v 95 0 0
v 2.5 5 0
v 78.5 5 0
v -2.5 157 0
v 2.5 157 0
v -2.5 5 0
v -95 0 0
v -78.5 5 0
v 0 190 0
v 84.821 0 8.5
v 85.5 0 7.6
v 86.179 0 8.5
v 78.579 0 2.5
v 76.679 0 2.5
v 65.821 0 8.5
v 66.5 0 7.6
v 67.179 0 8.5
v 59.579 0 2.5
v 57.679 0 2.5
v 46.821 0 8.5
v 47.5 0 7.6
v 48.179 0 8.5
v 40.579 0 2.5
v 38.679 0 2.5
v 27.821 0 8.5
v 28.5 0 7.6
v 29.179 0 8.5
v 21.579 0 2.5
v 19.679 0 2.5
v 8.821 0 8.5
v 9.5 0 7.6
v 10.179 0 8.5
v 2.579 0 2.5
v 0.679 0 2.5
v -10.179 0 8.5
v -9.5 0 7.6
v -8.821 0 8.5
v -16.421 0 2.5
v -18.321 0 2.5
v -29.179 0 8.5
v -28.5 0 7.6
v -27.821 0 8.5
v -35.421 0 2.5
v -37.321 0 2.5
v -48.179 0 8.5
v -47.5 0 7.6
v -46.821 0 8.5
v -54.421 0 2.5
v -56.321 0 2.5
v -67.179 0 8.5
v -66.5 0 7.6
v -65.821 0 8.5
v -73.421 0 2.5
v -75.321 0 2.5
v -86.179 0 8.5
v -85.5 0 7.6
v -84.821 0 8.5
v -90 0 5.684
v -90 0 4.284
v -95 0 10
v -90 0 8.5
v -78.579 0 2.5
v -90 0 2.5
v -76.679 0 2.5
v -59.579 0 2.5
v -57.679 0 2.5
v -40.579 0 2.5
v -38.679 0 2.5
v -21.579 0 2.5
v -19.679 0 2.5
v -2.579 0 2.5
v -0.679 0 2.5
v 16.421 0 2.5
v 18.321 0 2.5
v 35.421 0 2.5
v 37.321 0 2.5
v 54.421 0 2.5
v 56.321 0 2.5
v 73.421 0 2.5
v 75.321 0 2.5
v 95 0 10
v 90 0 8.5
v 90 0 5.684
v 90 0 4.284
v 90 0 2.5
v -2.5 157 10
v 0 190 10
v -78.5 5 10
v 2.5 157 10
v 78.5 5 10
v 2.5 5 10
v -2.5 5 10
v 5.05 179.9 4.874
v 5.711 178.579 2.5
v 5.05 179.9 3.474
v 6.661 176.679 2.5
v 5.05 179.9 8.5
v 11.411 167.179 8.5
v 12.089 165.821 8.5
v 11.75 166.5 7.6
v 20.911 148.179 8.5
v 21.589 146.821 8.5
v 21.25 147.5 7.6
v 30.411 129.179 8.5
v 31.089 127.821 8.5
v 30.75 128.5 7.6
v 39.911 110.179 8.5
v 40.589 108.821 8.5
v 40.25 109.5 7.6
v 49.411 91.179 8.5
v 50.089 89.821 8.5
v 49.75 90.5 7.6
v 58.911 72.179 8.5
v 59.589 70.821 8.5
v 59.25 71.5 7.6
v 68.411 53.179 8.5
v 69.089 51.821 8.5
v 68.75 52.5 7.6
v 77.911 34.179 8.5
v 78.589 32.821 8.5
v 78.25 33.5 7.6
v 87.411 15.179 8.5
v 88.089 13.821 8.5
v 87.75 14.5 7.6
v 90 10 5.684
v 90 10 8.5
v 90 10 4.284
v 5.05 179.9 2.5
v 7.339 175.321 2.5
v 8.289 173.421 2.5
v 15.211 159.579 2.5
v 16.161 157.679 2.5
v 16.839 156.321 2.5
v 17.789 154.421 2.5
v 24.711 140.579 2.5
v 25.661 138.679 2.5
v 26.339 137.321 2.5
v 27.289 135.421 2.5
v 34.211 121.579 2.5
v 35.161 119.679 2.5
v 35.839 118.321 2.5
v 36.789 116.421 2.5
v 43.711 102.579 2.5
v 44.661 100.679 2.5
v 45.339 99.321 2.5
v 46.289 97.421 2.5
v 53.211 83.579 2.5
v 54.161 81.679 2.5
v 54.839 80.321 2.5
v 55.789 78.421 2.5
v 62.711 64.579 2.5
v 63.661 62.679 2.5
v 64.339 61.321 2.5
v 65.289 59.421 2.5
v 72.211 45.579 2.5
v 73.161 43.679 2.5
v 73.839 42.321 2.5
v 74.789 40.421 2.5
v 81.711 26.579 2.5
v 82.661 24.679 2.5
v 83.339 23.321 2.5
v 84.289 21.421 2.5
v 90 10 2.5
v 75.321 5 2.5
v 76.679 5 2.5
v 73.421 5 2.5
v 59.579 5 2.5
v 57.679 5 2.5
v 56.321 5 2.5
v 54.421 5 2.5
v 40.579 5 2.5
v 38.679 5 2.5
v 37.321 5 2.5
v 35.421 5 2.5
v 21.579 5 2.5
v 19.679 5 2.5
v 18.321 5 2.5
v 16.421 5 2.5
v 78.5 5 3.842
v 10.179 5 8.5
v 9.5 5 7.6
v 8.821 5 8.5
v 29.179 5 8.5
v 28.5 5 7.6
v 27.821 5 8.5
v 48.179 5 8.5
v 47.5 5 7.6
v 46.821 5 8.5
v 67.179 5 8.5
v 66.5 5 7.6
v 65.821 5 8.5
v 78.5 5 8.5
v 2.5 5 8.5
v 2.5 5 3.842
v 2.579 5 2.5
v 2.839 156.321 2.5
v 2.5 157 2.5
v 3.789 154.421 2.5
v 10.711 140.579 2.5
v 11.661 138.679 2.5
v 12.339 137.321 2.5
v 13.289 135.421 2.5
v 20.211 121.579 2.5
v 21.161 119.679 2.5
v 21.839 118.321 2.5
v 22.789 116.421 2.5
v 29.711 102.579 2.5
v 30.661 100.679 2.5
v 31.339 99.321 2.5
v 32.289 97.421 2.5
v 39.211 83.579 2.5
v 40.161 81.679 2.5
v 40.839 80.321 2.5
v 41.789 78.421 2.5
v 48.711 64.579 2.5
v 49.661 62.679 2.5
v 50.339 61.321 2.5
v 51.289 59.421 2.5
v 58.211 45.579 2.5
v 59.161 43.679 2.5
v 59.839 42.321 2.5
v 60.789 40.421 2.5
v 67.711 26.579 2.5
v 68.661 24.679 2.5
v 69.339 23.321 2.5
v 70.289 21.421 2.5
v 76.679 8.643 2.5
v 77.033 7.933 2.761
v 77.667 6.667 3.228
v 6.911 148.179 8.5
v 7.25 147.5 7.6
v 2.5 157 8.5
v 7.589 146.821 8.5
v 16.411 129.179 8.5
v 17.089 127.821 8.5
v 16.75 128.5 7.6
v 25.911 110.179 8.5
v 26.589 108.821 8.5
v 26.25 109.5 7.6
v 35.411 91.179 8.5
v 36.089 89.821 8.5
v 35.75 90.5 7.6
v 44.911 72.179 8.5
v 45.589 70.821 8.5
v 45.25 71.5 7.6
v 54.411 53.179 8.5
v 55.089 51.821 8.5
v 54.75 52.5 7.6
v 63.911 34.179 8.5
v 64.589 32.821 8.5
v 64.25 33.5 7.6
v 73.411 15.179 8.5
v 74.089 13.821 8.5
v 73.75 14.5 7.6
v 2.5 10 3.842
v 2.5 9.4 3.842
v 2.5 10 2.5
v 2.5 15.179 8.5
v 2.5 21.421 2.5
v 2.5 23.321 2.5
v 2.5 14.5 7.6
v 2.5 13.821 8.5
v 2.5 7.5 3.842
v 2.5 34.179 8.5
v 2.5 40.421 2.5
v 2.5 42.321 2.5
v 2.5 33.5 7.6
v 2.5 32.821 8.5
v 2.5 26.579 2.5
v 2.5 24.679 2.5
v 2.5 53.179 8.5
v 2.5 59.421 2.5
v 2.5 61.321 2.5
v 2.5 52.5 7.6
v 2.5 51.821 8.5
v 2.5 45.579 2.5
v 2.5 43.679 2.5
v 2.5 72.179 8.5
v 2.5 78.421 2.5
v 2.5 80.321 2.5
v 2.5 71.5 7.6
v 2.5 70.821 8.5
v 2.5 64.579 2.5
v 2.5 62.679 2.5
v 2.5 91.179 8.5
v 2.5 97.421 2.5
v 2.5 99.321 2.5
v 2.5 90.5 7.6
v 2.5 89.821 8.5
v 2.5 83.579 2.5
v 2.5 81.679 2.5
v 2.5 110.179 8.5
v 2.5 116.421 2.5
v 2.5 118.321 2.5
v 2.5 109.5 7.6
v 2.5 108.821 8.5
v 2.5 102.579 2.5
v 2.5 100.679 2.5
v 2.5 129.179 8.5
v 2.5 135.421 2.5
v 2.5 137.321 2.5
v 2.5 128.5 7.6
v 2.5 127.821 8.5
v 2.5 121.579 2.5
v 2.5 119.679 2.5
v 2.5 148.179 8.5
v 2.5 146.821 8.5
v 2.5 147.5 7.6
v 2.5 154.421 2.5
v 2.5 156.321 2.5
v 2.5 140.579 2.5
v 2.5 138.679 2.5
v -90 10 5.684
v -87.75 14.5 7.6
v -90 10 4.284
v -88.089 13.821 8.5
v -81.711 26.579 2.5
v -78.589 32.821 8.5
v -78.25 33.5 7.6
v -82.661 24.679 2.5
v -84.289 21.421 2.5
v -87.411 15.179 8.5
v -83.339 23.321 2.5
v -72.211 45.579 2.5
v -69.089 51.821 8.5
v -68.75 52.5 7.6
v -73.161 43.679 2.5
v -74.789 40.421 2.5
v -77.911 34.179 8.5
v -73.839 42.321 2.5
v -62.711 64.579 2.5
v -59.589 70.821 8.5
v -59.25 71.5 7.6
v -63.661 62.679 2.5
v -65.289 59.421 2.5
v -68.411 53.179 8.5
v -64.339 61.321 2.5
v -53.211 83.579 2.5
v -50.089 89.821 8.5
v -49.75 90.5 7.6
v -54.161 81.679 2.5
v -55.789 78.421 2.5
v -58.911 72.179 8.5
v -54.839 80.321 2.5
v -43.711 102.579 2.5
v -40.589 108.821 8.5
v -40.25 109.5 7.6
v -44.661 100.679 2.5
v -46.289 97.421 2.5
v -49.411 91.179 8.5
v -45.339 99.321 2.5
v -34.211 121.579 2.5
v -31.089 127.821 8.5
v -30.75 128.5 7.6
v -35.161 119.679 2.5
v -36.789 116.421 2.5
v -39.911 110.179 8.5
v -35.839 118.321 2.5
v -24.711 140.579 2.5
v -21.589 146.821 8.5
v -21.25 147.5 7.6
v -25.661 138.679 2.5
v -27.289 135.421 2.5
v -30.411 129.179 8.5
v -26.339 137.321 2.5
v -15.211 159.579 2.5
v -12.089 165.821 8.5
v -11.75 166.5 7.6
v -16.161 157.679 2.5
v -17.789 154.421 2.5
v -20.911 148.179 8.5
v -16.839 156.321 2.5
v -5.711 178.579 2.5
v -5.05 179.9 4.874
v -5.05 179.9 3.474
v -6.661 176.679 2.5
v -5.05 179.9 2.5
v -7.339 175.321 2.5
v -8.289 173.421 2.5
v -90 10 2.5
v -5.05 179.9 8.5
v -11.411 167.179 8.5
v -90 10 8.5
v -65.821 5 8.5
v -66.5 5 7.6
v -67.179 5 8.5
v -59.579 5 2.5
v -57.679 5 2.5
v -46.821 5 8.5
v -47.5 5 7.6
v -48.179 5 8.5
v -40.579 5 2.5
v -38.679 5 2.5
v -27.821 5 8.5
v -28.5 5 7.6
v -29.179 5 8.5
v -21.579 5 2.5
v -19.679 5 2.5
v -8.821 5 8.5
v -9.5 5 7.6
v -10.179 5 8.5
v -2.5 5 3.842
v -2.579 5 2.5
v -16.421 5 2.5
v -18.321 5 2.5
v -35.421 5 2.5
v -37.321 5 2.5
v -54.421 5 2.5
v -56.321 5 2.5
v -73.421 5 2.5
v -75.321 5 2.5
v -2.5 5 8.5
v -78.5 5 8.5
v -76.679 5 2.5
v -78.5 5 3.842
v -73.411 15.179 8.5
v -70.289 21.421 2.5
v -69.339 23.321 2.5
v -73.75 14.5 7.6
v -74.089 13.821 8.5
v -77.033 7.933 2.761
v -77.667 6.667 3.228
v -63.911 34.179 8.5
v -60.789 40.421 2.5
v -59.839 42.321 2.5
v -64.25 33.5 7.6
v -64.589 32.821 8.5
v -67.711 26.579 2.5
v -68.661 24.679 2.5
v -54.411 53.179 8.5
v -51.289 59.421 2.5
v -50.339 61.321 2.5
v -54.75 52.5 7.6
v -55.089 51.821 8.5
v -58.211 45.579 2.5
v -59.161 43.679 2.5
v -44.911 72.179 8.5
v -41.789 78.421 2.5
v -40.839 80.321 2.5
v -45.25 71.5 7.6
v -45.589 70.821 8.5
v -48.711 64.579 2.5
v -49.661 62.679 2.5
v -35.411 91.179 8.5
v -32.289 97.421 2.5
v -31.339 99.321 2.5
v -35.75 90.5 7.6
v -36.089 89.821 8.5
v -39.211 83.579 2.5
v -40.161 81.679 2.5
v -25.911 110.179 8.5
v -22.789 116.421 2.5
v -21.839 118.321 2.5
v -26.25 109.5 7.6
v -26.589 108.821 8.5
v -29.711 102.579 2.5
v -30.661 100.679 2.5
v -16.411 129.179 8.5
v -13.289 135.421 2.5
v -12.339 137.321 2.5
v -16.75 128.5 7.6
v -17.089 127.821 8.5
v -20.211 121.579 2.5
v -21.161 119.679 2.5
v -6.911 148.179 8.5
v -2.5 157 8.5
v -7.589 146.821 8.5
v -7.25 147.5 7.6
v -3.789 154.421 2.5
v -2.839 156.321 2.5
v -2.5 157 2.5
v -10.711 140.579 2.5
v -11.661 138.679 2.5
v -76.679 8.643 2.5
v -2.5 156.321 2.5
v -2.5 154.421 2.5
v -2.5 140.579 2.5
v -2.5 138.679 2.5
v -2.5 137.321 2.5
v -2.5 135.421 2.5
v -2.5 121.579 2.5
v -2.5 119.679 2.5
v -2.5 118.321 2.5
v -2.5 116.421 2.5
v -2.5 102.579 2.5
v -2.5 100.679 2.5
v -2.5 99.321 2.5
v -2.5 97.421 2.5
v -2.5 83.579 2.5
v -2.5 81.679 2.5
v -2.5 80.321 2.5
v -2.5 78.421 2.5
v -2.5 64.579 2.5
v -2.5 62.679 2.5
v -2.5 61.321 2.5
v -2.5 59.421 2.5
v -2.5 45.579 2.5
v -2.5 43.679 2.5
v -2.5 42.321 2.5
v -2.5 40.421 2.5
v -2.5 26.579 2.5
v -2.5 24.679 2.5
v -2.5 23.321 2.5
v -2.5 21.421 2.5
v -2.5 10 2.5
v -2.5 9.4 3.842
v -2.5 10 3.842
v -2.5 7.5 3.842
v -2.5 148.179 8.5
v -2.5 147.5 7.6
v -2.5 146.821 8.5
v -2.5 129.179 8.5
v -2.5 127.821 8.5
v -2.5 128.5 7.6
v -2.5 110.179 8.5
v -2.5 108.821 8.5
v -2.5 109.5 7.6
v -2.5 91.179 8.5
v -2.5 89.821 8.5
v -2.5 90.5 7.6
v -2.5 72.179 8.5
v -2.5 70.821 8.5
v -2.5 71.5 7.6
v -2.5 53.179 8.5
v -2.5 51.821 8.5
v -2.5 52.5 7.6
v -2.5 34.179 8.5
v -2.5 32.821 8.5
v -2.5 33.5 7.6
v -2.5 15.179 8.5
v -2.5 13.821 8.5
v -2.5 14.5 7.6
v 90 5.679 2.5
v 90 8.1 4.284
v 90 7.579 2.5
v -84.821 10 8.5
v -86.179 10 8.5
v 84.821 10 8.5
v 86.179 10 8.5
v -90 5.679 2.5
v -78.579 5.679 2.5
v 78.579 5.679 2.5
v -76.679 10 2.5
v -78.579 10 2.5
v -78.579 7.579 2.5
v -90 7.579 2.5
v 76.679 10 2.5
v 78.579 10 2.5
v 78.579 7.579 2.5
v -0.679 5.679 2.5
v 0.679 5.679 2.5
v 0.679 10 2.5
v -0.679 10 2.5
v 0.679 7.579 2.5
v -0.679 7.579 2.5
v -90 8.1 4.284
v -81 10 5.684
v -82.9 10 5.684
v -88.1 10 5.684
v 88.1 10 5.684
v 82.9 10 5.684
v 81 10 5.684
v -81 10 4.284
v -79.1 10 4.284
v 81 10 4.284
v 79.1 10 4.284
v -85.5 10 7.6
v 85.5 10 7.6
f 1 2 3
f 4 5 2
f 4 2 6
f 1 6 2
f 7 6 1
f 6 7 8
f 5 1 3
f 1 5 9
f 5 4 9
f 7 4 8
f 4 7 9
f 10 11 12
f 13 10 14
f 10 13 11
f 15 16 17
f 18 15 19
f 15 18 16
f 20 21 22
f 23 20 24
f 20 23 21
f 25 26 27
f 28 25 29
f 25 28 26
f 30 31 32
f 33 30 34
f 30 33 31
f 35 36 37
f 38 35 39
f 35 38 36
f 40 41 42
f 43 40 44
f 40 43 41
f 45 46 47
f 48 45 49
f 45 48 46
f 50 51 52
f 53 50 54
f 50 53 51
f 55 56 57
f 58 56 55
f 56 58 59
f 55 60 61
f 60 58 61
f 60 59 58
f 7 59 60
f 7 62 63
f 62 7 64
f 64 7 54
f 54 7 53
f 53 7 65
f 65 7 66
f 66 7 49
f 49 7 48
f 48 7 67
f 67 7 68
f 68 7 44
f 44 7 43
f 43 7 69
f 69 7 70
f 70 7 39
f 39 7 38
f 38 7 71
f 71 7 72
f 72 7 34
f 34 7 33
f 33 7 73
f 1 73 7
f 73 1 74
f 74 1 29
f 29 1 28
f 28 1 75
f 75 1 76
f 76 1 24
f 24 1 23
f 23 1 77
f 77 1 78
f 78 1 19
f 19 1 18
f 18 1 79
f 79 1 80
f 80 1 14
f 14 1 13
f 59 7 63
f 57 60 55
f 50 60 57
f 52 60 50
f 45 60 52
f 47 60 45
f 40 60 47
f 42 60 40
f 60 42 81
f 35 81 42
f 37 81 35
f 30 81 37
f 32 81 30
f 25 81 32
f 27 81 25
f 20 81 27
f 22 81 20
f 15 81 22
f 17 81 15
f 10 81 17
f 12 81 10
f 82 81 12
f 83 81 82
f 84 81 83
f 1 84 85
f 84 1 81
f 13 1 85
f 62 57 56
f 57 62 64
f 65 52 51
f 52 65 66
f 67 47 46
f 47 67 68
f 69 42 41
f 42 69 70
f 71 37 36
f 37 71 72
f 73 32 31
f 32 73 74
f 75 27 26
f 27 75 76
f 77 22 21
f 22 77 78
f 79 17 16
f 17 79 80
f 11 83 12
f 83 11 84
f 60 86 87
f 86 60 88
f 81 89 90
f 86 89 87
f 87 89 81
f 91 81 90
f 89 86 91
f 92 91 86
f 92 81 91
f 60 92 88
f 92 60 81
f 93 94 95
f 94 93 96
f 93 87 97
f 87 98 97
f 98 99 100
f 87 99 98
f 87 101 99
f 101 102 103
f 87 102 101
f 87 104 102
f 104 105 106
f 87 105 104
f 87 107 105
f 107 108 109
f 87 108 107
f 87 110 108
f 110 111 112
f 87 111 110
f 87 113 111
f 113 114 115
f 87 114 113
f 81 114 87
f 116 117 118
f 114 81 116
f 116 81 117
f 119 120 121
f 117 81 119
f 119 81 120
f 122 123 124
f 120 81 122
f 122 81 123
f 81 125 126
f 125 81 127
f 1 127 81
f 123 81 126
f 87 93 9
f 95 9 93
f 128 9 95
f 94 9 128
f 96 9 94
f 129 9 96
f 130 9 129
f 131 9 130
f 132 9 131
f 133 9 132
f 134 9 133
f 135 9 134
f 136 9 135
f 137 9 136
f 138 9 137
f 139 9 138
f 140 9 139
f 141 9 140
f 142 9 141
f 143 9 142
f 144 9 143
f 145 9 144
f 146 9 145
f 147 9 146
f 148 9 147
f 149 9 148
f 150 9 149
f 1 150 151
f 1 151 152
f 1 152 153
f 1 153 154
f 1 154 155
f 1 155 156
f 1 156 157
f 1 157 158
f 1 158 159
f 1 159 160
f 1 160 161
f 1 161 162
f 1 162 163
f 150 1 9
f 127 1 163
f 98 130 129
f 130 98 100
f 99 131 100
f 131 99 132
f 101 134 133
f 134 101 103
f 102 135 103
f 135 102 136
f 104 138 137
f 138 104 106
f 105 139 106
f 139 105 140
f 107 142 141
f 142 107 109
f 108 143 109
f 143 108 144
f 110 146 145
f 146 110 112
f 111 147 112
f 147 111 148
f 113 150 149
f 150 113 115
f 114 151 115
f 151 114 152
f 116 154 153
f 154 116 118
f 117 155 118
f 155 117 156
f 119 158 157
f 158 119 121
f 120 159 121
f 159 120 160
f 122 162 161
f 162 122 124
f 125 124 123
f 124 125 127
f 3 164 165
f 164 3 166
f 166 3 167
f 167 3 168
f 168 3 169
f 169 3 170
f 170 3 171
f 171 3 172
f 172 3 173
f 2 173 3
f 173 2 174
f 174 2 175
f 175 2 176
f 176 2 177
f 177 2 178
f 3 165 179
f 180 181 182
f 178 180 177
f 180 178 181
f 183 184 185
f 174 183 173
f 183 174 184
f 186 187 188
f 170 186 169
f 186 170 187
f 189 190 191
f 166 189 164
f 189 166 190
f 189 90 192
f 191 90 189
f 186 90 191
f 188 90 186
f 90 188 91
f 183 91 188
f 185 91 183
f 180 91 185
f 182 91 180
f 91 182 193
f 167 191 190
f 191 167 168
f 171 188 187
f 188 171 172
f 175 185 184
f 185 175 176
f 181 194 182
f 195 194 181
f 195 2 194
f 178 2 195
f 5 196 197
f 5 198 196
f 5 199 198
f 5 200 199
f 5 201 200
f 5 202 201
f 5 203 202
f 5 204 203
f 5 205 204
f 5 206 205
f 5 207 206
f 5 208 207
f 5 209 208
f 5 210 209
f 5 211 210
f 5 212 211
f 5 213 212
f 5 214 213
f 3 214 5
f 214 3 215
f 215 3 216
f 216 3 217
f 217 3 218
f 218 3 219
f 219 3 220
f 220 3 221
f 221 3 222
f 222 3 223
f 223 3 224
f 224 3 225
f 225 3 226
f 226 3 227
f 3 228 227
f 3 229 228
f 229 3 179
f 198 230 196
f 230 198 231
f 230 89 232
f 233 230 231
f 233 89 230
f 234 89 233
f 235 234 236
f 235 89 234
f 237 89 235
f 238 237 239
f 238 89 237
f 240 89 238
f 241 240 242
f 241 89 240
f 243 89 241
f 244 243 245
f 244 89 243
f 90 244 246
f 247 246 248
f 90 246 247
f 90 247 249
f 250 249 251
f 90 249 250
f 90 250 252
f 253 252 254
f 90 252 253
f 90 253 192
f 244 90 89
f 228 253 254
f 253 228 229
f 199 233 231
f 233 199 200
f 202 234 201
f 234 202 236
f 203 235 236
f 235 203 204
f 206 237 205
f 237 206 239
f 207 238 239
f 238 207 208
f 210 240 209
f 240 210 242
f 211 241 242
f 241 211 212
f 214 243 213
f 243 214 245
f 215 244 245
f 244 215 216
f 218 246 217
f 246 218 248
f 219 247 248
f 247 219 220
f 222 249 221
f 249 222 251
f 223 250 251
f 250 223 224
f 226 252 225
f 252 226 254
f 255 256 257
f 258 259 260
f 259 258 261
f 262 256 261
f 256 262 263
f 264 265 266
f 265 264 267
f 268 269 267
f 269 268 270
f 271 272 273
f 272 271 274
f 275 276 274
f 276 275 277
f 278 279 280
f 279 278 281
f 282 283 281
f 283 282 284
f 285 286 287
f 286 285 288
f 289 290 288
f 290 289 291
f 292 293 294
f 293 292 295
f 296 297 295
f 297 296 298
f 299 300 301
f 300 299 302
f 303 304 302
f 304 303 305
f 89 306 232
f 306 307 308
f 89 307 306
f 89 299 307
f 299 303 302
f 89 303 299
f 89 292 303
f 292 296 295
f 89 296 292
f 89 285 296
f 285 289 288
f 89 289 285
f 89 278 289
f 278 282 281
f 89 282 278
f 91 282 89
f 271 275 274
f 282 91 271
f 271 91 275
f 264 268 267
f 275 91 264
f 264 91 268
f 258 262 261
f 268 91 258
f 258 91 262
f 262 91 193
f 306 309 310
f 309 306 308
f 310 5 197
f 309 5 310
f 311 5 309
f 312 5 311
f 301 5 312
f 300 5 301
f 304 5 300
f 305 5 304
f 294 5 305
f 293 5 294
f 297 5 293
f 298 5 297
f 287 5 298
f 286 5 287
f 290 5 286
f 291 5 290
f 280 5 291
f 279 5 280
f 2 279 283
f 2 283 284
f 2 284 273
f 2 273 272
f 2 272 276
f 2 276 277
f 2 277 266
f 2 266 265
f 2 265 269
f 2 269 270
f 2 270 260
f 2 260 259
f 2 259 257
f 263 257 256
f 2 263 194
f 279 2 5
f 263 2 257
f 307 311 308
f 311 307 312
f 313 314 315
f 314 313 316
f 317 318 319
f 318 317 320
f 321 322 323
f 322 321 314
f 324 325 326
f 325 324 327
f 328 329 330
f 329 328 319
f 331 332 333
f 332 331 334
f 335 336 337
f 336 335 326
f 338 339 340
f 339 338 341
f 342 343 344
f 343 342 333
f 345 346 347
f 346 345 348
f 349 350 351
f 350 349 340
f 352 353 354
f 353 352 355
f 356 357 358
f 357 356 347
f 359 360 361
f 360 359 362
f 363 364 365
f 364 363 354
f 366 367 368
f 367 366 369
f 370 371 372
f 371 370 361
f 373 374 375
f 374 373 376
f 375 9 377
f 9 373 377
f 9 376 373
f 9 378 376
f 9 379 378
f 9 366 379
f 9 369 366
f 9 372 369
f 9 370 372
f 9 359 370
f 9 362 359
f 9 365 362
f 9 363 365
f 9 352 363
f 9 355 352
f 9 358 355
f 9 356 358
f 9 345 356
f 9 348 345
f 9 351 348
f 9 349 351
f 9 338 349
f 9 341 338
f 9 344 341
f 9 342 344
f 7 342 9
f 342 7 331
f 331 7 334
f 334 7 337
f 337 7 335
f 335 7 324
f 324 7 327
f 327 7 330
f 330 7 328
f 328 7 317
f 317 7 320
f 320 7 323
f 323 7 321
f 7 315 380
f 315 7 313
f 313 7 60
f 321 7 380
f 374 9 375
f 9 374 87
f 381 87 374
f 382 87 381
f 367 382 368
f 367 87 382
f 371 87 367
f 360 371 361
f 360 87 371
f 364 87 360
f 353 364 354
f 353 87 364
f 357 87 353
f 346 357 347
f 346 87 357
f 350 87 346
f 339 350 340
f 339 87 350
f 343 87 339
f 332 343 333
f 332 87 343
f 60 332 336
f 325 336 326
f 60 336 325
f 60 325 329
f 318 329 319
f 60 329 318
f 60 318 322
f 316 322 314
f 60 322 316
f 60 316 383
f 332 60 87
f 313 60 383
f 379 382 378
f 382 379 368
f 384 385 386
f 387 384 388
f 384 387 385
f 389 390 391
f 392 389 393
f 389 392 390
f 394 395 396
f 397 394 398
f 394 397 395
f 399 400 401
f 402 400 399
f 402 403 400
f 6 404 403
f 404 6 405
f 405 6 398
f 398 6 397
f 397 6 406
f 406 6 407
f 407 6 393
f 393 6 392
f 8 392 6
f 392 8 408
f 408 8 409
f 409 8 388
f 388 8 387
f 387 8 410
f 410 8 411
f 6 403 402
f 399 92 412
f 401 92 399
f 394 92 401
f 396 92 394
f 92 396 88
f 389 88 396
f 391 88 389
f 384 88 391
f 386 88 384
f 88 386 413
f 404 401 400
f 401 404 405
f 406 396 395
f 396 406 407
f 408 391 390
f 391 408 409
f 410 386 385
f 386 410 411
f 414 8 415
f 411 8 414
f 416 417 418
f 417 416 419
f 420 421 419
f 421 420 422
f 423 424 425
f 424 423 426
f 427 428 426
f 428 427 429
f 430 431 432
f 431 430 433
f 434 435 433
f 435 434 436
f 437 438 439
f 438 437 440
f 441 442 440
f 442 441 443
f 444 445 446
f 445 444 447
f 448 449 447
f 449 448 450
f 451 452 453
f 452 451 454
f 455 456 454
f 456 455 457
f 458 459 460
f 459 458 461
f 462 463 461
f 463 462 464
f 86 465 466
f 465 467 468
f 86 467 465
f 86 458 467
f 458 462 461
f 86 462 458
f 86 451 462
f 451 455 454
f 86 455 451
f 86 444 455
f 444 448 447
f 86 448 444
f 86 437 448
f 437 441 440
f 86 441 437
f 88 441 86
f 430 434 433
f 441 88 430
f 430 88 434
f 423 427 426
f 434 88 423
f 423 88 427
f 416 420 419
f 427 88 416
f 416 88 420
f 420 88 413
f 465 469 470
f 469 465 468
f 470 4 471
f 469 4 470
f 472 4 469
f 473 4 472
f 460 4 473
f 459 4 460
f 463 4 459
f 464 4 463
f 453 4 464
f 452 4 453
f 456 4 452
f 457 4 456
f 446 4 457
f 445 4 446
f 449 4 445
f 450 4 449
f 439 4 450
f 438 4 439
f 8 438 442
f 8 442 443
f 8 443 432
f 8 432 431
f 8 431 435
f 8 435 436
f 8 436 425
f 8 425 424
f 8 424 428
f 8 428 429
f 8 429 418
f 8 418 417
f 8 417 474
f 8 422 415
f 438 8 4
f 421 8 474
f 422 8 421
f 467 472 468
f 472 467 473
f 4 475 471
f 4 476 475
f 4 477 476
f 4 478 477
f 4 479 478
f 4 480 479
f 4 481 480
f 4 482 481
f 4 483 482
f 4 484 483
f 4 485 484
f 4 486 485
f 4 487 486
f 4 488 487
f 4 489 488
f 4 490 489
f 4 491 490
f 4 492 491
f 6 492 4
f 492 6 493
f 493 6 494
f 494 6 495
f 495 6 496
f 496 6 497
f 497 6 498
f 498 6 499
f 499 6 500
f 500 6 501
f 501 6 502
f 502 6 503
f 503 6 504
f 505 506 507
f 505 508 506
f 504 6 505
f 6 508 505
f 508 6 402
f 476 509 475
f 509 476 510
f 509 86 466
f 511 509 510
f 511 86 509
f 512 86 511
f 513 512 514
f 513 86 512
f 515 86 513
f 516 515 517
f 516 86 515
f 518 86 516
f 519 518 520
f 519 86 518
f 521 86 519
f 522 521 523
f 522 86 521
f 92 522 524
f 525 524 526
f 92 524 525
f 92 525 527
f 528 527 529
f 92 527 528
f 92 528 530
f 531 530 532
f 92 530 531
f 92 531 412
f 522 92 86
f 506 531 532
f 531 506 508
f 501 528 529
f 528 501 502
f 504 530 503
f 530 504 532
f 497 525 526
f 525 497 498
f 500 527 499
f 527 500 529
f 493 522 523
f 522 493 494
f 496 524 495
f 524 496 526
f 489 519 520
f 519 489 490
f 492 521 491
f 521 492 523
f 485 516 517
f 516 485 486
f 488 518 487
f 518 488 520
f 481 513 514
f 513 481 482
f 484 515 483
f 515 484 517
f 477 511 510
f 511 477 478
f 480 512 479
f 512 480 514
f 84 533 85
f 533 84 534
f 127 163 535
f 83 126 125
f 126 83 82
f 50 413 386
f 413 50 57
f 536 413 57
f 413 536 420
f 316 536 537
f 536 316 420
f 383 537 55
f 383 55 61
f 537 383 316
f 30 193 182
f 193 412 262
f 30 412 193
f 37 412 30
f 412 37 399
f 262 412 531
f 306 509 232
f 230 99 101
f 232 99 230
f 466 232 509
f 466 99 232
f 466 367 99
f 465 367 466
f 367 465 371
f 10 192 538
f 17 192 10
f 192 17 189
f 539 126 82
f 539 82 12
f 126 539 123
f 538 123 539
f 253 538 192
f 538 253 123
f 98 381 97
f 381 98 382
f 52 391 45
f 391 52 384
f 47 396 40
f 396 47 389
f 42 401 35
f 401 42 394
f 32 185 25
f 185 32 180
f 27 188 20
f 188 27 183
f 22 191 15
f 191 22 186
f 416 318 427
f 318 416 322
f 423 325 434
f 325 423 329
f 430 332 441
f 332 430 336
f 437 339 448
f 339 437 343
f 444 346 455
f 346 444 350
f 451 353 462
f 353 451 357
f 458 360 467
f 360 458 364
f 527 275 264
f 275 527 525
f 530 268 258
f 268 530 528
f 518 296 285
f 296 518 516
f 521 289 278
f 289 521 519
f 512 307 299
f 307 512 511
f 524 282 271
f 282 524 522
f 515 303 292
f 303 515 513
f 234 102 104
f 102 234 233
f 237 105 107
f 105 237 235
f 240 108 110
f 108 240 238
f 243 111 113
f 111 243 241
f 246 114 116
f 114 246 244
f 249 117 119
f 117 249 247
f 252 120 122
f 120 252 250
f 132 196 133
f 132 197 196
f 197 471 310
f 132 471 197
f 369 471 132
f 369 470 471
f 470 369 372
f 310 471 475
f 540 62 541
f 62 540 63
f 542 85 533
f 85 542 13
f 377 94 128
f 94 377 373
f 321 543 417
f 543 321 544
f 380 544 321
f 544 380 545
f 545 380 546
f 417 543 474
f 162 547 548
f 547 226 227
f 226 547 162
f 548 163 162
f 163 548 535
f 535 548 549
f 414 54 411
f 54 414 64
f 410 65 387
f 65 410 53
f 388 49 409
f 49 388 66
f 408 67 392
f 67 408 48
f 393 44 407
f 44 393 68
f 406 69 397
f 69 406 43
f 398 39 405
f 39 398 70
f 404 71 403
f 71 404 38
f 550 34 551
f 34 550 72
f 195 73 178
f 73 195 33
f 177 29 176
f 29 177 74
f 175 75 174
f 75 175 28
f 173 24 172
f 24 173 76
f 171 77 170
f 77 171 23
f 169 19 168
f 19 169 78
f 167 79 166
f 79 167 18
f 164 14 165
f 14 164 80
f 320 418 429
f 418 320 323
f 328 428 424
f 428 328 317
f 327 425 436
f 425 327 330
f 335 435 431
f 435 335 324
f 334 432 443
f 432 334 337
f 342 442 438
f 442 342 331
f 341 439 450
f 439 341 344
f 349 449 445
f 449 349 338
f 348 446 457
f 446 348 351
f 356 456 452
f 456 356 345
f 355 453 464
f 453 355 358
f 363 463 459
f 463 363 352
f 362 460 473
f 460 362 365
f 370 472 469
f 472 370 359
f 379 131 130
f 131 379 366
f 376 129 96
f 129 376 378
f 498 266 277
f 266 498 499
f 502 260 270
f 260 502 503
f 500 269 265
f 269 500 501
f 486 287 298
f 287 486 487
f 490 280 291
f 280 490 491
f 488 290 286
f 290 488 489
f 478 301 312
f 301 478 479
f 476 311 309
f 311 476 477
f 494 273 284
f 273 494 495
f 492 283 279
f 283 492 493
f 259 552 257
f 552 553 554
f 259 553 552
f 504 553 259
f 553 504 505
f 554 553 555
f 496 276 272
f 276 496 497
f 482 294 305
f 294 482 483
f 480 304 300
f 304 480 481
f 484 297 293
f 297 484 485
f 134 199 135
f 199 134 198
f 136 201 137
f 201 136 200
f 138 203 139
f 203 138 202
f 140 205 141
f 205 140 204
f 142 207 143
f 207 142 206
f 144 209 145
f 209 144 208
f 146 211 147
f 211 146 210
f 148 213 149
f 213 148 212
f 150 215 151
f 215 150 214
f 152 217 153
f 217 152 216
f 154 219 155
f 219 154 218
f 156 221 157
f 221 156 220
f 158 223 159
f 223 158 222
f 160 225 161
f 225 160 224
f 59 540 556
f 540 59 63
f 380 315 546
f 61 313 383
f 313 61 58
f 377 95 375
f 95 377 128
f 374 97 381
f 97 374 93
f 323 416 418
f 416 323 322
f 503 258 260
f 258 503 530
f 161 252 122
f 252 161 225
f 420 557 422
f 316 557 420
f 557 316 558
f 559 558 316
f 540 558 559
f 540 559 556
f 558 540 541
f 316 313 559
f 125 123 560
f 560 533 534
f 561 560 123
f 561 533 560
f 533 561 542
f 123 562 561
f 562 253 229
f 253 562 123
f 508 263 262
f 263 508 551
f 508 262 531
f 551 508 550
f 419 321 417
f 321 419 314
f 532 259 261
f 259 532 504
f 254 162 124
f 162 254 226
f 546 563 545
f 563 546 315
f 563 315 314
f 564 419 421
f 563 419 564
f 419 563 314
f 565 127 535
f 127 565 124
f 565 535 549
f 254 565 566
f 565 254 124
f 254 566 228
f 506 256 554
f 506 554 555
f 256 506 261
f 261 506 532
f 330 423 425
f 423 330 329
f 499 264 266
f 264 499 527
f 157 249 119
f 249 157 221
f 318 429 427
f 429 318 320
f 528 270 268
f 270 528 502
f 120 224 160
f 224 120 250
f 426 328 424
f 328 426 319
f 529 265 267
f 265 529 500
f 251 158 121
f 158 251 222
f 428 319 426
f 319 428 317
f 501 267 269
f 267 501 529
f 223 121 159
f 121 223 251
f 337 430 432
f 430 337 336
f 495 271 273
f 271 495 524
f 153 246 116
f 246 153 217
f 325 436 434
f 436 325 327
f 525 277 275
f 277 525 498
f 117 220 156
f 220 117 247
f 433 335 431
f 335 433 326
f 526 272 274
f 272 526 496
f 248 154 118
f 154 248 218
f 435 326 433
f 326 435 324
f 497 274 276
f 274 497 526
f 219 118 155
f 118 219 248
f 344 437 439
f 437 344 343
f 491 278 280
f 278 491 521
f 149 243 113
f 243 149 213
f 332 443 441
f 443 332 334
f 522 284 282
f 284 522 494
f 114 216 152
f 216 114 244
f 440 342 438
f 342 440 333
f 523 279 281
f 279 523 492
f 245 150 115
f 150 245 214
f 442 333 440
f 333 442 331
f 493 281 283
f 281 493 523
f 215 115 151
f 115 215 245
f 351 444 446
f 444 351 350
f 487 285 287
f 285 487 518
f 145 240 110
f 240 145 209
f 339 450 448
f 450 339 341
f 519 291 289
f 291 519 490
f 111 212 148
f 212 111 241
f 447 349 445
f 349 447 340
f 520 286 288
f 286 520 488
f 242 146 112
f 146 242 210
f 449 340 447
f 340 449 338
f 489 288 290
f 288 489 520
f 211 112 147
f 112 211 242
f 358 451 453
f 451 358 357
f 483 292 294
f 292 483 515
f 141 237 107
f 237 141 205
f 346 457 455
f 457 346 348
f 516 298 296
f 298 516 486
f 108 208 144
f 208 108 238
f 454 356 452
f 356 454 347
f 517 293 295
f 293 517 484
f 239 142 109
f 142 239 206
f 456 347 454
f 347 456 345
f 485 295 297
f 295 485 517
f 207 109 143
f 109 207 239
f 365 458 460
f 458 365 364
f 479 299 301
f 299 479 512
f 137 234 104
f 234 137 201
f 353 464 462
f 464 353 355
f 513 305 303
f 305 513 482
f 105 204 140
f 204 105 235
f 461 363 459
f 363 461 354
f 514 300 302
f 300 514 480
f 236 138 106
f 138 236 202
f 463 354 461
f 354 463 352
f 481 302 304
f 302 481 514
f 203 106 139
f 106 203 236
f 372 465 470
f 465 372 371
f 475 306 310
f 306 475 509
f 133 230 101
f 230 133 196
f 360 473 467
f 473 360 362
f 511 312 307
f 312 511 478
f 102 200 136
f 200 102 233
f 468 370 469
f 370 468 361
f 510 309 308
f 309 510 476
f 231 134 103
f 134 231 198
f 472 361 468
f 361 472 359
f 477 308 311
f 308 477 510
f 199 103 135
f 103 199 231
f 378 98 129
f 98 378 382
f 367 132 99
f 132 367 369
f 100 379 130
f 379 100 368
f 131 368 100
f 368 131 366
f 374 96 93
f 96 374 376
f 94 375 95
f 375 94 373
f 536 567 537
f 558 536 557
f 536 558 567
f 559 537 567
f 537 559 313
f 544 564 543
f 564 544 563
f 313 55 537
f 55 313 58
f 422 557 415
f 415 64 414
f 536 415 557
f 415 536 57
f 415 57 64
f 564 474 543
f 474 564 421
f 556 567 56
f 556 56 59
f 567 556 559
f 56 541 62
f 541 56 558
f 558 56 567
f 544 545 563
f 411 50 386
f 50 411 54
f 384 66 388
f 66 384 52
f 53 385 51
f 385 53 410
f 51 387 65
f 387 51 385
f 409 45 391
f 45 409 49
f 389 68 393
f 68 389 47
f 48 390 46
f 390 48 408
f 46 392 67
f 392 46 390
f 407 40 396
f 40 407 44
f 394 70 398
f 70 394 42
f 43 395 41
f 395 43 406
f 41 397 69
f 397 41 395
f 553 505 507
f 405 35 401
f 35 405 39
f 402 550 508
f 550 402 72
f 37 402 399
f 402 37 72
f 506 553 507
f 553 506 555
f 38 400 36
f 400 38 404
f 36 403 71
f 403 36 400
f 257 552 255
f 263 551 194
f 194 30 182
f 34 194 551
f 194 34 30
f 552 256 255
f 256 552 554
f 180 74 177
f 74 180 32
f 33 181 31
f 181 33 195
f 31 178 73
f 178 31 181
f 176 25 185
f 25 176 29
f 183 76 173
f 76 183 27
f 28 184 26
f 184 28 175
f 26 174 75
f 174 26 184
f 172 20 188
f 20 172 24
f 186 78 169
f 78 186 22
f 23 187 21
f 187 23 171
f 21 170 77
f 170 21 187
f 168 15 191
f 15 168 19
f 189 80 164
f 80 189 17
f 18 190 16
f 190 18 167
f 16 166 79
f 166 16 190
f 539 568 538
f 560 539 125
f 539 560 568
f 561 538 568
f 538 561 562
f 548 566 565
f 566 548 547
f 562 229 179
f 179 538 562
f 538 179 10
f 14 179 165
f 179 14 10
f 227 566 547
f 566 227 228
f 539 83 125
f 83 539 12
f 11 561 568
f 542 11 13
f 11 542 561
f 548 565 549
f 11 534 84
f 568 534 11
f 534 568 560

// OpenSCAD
/**
Fully parametric plant-car chassis. It generates a triangular chassis of a certain
length & width with set wall thickness and adds a pattern of triangles in between the 
ceiling and floor, which reduces material while distributing weight.
**/

use <MCAD/triangles.scad>

// the chassis' height & width are the same
length = 190;
// denominator to compute pattern width
pattern_factor = 10;
// the depth of the chassis as measure from floor to ceiling
depth = 10;
// vertical wall thickness
wall_thick = 5;
// floor and ceiling thickness
roof_thick = 2;

// ------------- chassis base -----------------------------------------
// a solid triangle with the right measurements
module solid_double_base() {  
    module half_base(b = 190, t = 10) {
        difference() {
             triangle(b, b / 2, t);
            // the inner triangle is 80% of the outer
            factor = 0.8;
            translate([wall_thick / 2, wall_thick, 0]) 
                scale([factor, factor, 1])
                    triangle(b, b / 2, t);
        }
    }
    
    half_base(length, depth);
    mirror([1, 0, 0]) half_base(length, depth);
}

// plots a solid base and makes it hull such that wall thickness matches params
module base() {    
    difference() {
        color("red") solid_double_base();
        translate([-(length / 2) + wall_thick, -0.1, wall_thick / 2])
            cube(
                [length - wall_thick * 2, length - wall_thick * 2, depth - roof_thick * 2], 
                center = false
            );
    }
}

// ------------- triangle pattern -----------------------------------------
// the width of a single triangle in the pattern - 10 is a sensible default
t_pattern_base_width = length / pattern_factor;

// a single triangle in the pattern of variable length
module single_triangle(length = length) {
    // an element is made of an outer, larger triangle with a smaller one cut into it
    module outer_triangle() {
        union() {
            rotate([0, -90, 0]) triangle(t_pattern_base_width / 2, depth - 3, length);
            mirror([0, 1, 0]) 
                rotate([0, -90, 0]) triangle(t_pattern_base_width / 2, depth - 3, length);
        }
    }

    difference() {
        outer_triangle();
        scale([1, 0.8, 0.8]) outer_triangle();
    }
}

// a triangle pattern is made of a single vertical row for the base and n horizontal rows
// that cover the height of the chassis
module triangle_pattern(n=1) {   
    union() {
        // make n horizontal rows of long triangles
        for (i = [0:1:n-1]) {
            translate([0, 19*i, 0])
                translate([length / 2, t_pattern_base_width / 2 + wall_thick, roof_thick]) 
                    single_triangle();
        }
        
        // make a single vertical row of short triangles
        for (i = [-10:1:10]) {
            translate([
                t_pattern_base_width / 2 + i*t_pattern_base_width, 
                wall_thick * 2, 
                roof_thick
            ]) 
                rotate([0, 0, 90]) single_triangle(10);
        }
    }
}

//// the final chassis is a union of the base and the pattern
union() {
    color("blue") base();
    // this intersection generates the actual pattern
    intersection() {
        solid_double_base();
        triangle_pattern(n = 50);
    }
}
